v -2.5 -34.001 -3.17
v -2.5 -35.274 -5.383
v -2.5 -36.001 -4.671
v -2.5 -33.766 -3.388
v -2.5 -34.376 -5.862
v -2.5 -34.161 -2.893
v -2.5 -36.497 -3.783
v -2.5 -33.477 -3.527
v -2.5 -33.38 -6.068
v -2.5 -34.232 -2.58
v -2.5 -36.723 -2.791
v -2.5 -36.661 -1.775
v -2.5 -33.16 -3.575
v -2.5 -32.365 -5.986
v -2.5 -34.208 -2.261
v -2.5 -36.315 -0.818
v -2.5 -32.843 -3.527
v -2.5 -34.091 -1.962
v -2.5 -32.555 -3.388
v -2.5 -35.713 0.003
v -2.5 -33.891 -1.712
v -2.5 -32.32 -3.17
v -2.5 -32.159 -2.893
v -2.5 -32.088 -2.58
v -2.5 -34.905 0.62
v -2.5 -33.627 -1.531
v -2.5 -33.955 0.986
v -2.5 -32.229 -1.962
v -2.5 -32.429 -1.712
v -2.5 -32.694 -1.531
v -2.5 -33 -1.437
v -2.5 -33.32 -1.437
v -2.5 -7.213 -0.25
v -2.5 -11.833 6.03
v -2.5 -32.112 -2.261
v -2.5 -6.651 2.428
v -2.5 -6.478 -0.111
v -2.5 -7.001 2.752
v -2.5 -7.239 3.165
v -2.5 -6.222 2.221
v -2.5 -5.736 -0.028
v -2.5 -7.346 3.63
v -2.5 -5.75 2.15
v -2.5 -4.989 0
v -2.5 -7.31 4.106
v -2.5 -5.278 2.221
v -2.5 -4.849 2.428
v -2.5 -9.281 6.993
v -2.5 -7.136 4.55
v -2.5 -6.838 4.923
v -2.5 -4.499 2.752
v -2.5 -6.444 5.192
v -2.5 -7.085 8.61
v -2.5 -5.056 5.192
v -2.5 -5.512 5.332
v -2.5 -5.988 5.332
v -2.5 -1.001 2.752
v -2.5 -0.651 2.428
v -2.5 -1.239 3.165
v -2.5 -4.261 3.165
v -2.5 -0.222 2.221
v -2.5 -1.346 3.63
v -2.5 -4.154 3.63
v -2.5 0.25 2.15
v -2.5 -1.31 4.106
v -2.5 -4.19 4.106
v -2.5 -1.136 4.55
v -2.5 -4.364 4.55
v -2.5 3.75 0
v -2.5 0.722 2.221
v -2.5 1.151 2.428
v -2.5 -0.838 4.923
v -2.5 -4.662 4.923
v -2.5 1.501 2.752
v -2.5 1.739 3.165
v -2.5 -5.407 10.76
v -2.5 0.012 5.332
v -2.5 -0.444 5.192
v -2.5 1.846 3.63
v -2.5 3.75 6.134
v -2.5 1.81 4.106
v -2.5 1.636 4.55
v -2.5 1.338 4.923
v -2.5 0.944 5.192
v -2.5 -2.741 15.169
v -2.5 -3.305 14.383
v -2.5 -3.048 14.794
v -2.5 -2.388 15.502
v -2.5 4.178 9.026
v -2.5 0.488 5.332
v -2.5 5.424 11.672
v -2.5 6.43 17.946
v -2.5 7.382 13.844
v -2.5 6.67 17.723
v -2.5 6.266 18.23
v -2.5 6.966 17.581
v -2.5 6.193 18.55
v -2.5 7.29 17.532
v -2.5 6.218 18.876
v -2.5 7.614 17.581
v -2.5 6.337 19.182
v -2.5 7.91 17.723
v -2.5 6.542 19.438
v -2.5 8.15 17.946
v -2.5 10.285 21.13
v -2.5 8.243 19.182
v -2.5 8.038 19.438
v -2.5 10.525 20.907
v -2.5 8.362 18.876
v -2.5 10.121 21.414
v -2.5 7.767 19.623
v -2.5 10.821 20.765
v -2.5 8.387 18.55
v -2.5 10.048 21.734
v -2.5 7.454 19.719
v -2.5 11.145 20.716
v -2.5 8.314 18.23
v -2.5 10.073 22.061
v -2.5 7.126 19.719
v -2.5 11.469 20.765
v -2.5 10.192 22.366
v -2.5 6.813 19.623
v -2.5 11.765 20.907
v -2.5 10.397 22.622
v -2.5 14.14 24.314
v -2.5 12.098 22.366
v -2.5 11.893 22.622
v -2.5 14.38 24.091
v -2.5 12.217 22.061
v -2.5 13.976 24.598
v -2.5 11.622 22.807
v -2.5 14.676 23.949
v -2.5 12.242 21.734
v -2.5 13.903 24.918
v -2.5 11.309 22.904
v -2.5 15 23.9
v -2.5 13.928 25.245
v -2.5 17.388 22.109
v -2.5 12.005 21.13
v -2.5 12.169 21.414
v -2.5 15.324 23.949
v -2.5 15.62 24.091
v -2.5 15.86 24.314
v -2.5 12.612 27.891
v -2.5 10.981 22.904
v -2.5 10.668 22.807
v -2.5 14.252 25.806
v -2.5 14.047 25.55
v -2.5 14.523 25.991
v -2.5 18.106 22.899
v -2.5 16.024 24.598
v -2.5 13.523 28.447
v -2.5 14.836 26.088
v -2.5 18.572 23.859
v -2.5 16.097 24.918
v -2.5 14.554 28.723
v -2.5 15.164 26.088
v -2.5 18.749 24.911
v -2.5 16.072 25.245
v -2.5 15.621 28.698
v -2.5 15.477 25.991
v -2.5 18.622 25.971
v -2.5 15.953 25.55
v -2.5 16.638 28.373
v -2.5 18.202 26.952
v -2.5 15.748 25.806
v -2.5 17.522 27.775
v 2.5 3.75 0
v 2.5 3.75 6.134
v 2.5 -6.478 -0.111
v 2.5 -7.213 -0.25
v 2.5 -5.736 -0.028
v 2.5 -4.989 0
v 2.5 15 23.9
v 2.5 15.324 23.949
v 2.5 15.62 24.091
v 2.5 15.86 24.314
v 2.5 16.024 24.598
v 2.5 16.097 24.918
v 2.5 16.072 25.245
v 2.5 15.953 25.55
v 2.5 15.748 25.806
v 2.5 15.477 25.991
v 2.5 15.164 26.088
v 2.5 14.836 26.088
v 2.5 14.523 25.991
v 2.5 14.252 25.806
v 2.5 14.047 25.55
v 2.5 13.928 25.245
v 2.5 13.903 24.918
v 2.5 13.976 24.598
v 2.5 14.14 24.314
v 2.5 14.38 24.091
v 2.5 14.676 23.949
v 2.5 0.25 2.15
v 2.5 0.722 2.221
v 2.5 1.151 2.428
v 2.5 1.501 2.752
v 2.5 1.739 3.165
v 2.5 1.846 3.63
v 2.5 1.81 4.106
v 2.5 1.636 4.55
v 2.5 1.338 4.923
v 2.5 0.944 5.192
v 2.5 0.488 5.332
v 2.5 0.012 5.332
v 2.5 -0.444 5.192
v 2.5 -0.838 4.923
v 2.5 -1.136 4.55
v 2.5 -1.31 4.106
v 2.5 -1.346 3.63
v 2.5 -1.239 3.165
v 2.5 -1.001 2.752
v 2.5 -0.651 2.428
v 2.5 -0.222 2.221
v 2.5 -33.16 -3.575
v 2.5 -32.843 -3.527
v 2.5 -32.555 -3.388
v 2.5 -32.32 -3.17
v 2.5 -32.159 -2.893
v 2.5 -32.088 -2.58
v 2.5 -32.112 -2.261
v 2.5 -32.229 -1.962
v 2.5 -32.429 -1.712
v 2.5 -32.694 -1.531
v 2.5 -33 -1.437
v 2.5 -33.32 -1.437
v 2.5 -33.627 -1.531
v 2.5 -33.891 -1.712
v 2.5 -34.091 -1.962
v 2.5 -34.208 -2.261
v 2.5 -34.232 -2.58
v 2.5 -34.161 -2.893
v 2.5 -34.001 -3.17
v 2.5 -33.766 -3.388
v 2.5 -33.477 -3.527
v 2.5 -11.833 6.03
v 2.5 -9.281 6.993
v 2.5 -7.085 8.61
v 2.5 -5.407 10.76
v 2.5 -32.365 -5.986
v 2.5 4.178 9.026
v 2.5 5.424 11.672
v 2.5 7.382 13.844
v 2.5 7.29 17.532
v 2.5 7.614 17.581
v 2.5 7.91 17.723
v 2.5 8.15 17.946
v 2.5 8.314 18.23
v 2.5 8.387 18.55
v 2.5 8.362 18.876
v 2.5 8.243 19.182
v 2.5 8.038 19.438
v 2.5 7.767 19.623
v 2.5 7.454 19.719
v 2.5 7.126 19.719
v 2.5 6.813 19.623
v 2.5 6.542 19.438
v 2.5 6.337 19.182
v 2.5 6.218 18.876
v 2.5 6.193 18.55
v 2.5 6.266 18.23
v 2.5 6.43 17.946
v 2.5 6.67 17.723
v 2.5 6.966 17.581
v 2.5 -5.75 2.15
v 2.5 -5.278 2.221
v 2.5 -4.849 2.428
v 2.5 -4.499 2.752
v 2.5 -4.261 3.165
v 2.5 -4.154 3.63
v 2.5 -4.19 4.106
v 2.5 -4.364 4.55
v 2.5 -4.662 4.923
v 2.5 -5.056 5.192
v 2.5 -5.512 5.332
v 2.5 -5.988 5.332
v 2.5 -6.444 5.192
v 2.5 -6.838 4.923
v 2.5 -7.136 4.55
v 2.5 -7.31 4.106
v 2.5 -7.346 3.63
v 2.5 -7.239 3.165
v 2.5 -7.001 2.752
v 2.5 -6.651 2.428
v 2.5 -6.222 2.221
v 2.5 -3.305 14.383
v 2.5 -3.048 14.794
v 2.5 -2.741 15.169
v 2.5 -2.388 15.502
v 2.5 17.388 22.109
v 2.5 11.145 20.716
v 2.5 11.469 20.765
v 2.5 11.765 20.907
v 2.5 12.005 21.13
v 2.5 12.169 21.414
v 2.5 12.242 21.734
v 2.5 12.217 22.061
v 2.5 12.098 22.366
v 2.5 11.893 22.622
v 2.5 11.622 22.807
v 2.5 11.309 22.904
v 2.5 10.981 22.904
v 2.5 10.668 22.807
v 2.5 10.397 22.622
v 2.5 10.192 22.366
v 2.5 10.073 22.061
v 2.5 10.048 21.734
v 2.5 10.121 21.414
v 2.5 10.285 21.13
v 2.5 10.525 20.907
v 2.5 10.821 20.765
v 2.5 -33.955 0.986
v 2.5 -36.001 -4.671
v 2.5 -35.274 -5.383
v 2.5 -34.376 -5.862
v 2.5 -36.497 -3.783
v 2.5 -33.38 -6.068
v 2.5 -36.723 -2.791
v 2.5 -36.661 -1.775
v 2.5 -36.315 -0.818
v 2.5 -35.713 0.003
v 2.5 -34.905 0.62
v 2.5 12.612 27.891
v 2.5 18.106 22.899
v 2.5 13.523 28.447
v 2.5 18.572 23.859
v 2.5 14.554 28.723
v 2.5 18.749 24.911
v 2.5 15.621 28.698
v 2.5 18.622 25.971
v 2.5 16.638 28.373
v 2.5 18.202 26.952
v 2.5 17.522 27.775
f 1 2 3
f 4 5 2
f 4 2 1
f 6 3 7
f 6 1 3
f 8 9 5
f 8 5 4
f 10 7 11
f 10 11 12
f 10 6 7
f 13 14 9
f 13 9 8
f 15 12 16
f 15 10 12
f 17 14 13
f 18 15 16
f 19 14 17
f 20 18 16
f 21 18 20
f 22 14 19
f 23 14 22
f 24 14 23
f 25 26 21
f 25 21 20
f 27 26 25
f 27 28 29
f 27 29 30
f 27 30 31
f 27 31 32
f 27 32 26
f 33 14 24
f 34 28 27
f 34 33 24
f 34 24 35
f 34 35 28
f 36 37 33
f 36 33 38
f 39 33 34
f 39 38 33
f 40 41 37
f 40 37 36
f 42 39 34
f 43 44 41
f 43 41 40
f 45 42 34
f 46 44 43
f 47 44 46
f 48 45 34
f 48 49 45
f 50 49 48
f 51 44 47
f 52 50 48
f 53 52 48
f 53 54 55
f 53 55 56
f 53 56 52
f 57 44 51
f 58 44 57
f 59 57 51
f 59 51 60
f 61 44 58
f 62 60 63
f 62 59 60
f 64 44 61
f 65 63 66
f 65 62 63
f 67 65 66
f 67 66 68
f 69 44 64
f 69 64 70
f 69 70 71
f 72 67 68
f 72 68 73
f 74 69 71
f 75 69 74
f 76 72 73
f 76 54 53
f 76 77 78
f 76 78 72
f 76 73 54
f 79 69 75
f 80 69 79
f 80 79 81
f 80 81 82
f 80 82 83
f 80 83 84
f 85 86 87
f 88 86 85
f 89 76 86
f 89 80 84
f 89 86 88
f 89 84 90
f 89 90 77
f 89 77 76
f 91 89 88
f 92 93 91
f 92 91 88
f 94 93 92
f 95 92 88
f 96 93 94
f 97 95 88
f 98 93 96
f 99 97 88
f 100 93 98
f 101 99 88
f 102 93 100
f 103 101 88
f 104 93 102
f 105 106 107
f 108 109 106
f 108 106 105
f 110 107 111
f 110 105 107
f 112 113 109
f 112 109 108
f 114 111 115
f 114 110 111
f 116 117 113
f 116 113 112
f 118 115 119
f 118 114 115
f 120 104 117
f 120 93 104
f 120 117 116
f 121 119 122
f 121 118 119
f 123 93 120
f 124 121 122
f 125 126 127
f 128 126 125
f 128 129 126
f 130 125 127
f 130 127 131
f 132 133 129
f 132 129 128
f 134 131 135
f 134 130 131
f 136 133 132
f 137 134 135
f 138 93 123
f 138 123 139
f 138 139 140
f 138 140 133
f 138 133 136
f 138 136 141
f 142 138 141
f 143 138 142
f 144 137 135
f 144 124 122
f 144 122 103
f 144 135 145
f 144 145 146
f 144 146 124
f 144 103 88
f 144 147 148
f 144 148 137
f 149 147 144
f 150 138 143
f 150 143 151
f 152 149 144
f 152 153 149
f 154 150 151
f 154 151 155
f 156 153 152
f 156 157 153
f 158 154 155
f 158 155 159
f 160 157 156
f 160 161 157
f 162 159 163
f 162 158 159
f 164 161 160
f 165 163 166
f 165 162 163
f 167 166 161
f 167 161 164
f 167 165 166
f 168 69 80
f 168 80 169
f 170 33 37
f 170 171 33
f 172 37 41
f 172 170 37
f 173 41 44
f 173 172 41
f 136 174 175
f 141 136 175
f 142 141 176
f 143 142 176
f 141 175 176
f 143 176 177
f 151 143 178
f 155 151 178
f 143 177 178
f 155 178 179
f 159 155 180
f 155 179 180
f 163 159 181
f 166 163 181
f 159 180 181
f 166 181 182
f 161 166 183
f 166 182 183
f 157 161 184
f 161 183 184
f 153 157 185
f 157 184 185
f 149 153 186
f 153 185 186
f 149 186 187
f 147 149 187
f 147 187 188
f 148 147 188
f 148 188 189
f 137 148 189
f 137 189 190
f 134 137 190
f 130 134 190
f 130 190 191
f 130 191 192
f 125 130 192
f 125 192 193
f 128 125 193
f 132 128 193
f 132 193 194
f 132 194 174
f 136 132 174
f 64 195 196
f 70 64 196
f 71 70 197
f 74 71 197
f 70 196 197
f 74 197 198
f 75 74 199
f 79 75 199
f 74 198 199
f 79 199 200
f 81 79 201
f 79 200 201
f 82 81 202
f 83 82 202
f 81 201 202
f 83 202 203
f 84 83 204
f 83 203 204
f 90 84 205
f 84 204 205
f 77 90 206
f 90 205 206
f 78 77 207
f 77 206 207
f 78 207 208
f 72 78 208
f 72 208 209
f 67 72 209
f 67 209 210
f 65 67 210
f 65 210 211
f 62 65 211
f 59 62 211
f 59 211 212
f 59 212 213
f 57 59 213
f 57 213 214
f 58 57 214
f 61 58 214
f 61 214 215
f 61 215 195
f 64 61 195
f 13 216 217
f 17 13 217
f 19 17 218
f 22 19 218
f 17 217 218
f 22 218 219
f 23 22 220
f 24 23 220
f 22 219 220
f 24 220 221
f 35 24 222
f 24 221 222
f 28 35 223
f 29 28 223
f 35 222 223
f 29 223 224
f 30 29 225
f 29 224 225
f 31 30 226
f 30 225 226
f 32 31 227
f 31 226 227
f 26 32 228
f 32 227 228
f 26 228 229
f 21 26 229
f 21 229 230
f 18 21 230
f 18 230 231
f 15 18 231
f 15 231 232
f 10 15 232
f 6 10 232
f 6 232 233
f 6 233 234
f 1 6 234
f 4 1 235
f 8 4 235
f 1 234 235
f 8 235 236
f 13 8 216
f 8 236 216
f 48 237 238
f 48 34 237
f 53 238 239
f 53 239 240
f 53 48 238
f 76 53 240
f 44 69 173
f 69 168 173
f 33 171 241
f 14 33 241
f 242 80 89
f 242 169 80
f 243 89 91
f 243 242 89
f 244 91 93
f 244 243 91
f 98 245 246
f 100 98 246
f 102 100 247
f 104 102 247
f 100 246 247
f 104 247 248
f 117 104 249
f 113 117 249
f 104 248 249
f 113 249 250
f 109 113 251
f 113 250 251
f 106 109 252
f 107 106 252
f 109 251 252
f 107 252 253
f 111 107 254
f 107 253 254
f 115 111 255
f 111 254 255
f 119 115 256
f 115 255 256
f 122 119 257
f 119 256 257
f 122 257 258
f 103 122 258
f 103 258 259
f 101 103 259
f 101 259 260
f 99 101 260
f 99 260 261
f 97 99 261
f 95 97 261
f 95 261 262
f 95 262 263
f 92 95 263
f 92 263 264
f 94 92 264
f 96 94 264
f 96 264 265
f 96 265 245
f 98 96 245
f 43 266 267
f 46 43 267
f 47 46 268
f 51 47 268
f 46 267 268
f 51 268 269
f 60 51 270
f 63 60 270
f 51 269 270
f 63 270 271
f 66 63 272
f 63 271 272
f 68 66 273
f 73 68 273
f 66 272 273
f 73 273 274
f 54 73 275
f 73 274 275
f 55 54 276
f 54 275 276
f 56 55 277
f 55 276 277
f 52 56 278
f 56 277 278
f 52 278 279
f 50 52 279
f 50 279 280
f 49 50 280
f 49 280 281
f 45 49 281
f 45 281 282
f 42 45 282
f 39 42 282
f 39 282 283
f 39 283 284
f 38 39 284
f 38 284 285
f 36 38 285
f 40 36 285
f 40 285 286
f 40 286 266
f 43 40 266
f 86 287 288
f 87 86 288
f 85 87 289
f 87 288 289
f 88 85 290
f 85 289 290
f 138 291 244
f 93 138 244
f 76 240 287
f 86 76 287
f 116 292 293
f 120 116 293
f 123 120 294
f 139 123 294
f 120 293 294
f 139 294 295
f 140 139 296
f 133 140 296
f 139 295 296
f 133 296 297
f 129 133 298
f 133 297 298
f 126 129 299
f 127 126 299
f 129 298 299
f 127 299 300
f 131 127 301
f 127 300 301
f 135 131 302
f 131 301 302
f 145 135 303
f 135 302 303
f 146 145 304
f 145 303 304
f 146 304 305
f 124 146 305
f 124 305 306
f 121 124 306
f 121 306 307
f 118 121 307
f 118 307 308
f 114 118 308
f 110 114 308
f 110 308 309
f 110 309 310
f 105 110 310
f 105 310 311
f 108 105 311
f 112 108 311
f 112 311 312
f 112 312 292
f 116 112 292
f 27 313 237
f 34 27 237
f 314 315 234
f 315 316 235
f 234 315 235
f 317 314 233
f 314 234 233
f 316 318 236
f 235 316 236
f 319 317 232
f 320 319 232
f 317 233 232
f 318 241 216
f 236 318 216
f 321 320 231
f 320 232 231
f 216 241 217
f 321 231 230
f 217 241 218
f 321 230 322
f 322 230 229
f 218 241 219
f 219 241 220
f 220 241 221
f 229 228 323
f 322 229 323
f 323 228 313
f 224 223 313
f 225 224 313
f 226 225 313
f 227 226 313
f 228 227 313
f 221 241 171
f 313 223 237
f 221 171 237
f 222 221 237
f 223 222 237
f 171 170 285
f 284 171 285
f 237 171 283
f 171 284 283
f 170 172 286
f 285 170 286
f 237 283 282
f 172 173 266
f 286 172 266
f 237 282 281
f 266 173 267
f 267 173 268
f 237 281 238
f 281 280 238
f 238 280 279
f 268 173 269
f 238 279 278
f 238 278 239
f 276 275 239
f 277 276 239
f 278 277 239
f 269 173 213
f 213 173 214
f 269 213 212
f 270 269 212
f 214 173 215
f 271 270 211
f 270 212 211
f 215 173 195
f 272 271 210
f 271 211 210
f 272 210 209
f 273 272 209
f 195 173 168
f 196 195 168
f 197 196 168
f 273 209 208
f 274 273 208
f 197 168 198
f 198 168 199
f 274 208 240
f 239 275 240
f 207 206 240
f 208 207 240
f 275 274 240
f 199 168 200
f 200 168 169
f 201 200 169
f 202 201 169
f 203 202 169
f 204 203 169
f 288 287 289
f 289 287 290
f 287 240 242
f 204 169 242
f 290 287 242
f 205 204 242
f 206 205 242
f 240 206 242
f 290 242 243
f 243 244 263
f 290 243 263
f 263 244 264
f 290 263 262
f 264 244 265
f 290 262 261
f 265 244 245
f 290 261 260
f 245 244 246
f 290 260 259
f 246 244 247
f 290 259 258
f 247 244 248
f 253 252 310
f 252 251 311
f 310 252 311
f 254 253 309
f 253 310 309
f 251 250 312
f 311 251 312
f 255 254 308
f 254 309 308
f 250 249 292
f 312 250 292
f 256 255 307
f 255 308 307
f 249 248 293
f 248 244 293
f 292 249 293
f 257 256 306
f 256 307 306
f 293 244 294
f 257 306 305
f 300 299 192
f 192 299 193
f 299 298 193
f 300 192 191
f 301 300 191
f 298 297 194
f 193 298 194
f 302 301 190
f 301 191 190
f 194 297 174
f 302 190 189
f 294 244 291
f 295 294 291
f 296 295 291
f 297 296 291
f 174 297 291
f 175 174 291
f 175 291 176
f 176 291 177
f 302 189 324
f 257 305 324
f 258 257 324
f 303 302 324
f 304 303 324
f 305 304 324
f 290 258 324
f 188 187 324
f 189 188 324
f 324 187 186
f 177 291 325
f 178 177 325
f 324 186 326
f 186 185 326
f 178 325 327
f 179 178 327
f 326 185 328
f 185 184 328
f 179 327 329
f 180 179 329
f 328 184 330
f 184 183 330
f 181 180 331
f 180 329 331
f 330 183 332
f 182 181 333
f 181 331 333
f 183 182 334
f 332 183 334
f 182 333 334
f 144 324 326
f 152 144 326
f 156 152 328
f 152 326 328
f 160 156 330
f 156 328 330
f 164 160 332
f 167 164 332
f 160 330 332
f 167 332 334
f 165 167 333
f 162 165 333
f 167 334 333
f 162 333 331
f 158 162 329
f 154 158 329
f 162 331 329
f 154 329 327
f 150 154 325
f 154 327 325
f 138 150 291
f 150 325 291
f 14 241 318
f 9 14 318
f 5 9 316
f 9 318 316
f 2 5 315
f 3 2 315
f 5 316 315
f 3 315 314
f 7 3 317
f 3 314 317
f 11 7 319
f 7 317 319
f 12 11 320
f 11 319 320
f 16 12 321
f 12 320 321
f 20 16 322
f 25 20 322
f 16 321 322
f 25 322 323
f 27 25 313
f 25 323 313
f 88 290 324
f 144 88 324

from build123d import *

# Parameters (mm, degrees)
SKETCH1_W           = 5
SKETCH1_H           = 7.5
BOSS_EXTRUDE1_DEPTH = 13
BOSS_EXTRUDE4_DEPTH = 5
SKETCH2_R           = 1.1
CUT_EXTRUDE1_DEPTH  = 35.686092314
LPATTERN1_COUNT     = 3
LPATTERN1_PITCH     = 5
SKETCH3_R           = 1.6
CUT_EXTRUDE2_DEPTH  = 35.686092314
BOSS_EXTRUDE2_DEPTH = 5
LPATTERN2_COUNT     = 2
LPATTERN2_PITCH     = 6
SKETCH5_R           = 1.075
SKETCH5_R_2         = 1.6
BOSS_EXTRUDE3_DEPTH = 5
FILLET2_R           = 10


with BuildPart() as part:
    # Sketch1 → Boss-Extrude1 (new body)
    with BuildSketch(Plane.XY):
        Rectangle(SKETCH1_W, SKETCH1_H)
    extrude(amount=BOSS_EXTRUDE1_DEPTH)

    # Sketch6 → Boss-Extrude4 (add)
    with BuildSketch(Plane(origin=(2.5, 0, 0), x_dir=(0, 0, -1), z_dir=(1, 0, 0))):
        with BuildLine():
            Line((-15.501719728, -2.388104729), (-27.89127235, 12.611895271))
            ThreePointArc((-27.89127235, 12.611895271), (-27.388104729, 17.89127235), (-22.10872765, 17.388104729))
            Line((-22.10872765, 17.388104729), (-9.719175027, 2.388104729))
            ThreePointArc((-9.719175027, 2.388104729), (-10.222342649, -2.89127235), (-15.501719728, -2.388104729))
        make_face()
    extrude(amount=-BOSS_EXTRUDE4_DEPTH)

    # Sketch2 → Cut-Extrude1 (cut, through all)
    with BuildSketch(Plane(origin=(2.5, 0, 0), x_dir=(0, 0, -1), z_dir=(1, 0, 0))):
        with Locations((-25, 15)):
            Circle(SKETCH2_R)
    cut_extrude1 = extrude(amount=-CUT_EXTRUDE1_DEPTH, mode=Mode.SUBTRACT)

    # LPattern1: Cut-Extrude1 ×3
    with Locations(*[Vector(0, -0.7710059601120912, -0.6368279276787667) * (i * LPATTERN1_PITCH) for i in range(1, LPATTERN1_COUNT)]):
        add(cut_extrude1, mode=Mode.SUBTRACT)

    # Sketch3 → Cut-Extrude2 (cut, through all)
    with BuildSketch(Plane(origin=(2.5, 0, 0), x_dir=(0, 0, -1), z_dir=(1, 0, 0))):
        with Locations((-3.75, 0.25)):
            Circle(SKETCH3_R)
    cut_extrude2 = extrude(amount=-CUT_EXTRUDE2_DEPTH, mode=Mode.SUBTRACT)

    # Sketch4 → Boss-Extrude2 (add)
    with BuildSketch(Plane(origin=(2.5, 0, 0), x_dir=(0, 0, -1), z_dir=(1, 0, 0))):
        Polygon((0, -3.75), (0, -8.75), (-5, -8.75), (-14.382714397, -3.304779813), align=None)
    extrude(amount=-BOSS_EXTRUDE2_DEPTH)

    # LPattern2: Cut-Extrude2 ×2
    with Locations(*[(0, -i * LPATTERN2_PITCH, 0) for i in range(1, LPATTERN2_COUNT)]):
        add(cut_extrude2, mode=Mode.SUBTRACT)

    # Sketch5 → Boss-Extrude3 (add)
    with BuildSketch(Plane(origin=(2.5, 0, 0), x_dir=(0, 0, -1), z_dir=(1, 0, 0))):
        with BuildLine():
            Line((-0.985537893, -33.954911928), (-7.235537893, -6.544764489))
            ThreePointArc((-7.235537893, -6.544764489), (-4.544764489, -2.264462107), (-0.264462107, -4.955235511))
            Line((-0.264462107, -4.955235511), (5.985537893, -32.365382949))
            ThreePointArc((5.985537893, -32.365382949), (3.294764489, -36.645685332), (-0.985537893, -33.954911928))
        make_face()
        with Locations((2.5, -33.160147439)):
            Circle(SKETCH5_R, mode=Mode.SUBTRACT)
        with Locations((-3.75, -5.75)):
            Circle(SKETCH5_R_2, mode=Mode.SUBTRACT)
    extrude(amount=-BOSS_EXTRUDE3_DEPTH)

    # Fillet2
    fillet2_edges = [part.edges().sort_by_distance(p)[0] for p in [
        (0, 3.75, 10.844059902),
        (0, -7.591071621, 6.996961301),
        (0, -6.115066764, 0),
    ]]
    fillet(fillet2_edges, radius=FILLET2_R)


solid = part.part
